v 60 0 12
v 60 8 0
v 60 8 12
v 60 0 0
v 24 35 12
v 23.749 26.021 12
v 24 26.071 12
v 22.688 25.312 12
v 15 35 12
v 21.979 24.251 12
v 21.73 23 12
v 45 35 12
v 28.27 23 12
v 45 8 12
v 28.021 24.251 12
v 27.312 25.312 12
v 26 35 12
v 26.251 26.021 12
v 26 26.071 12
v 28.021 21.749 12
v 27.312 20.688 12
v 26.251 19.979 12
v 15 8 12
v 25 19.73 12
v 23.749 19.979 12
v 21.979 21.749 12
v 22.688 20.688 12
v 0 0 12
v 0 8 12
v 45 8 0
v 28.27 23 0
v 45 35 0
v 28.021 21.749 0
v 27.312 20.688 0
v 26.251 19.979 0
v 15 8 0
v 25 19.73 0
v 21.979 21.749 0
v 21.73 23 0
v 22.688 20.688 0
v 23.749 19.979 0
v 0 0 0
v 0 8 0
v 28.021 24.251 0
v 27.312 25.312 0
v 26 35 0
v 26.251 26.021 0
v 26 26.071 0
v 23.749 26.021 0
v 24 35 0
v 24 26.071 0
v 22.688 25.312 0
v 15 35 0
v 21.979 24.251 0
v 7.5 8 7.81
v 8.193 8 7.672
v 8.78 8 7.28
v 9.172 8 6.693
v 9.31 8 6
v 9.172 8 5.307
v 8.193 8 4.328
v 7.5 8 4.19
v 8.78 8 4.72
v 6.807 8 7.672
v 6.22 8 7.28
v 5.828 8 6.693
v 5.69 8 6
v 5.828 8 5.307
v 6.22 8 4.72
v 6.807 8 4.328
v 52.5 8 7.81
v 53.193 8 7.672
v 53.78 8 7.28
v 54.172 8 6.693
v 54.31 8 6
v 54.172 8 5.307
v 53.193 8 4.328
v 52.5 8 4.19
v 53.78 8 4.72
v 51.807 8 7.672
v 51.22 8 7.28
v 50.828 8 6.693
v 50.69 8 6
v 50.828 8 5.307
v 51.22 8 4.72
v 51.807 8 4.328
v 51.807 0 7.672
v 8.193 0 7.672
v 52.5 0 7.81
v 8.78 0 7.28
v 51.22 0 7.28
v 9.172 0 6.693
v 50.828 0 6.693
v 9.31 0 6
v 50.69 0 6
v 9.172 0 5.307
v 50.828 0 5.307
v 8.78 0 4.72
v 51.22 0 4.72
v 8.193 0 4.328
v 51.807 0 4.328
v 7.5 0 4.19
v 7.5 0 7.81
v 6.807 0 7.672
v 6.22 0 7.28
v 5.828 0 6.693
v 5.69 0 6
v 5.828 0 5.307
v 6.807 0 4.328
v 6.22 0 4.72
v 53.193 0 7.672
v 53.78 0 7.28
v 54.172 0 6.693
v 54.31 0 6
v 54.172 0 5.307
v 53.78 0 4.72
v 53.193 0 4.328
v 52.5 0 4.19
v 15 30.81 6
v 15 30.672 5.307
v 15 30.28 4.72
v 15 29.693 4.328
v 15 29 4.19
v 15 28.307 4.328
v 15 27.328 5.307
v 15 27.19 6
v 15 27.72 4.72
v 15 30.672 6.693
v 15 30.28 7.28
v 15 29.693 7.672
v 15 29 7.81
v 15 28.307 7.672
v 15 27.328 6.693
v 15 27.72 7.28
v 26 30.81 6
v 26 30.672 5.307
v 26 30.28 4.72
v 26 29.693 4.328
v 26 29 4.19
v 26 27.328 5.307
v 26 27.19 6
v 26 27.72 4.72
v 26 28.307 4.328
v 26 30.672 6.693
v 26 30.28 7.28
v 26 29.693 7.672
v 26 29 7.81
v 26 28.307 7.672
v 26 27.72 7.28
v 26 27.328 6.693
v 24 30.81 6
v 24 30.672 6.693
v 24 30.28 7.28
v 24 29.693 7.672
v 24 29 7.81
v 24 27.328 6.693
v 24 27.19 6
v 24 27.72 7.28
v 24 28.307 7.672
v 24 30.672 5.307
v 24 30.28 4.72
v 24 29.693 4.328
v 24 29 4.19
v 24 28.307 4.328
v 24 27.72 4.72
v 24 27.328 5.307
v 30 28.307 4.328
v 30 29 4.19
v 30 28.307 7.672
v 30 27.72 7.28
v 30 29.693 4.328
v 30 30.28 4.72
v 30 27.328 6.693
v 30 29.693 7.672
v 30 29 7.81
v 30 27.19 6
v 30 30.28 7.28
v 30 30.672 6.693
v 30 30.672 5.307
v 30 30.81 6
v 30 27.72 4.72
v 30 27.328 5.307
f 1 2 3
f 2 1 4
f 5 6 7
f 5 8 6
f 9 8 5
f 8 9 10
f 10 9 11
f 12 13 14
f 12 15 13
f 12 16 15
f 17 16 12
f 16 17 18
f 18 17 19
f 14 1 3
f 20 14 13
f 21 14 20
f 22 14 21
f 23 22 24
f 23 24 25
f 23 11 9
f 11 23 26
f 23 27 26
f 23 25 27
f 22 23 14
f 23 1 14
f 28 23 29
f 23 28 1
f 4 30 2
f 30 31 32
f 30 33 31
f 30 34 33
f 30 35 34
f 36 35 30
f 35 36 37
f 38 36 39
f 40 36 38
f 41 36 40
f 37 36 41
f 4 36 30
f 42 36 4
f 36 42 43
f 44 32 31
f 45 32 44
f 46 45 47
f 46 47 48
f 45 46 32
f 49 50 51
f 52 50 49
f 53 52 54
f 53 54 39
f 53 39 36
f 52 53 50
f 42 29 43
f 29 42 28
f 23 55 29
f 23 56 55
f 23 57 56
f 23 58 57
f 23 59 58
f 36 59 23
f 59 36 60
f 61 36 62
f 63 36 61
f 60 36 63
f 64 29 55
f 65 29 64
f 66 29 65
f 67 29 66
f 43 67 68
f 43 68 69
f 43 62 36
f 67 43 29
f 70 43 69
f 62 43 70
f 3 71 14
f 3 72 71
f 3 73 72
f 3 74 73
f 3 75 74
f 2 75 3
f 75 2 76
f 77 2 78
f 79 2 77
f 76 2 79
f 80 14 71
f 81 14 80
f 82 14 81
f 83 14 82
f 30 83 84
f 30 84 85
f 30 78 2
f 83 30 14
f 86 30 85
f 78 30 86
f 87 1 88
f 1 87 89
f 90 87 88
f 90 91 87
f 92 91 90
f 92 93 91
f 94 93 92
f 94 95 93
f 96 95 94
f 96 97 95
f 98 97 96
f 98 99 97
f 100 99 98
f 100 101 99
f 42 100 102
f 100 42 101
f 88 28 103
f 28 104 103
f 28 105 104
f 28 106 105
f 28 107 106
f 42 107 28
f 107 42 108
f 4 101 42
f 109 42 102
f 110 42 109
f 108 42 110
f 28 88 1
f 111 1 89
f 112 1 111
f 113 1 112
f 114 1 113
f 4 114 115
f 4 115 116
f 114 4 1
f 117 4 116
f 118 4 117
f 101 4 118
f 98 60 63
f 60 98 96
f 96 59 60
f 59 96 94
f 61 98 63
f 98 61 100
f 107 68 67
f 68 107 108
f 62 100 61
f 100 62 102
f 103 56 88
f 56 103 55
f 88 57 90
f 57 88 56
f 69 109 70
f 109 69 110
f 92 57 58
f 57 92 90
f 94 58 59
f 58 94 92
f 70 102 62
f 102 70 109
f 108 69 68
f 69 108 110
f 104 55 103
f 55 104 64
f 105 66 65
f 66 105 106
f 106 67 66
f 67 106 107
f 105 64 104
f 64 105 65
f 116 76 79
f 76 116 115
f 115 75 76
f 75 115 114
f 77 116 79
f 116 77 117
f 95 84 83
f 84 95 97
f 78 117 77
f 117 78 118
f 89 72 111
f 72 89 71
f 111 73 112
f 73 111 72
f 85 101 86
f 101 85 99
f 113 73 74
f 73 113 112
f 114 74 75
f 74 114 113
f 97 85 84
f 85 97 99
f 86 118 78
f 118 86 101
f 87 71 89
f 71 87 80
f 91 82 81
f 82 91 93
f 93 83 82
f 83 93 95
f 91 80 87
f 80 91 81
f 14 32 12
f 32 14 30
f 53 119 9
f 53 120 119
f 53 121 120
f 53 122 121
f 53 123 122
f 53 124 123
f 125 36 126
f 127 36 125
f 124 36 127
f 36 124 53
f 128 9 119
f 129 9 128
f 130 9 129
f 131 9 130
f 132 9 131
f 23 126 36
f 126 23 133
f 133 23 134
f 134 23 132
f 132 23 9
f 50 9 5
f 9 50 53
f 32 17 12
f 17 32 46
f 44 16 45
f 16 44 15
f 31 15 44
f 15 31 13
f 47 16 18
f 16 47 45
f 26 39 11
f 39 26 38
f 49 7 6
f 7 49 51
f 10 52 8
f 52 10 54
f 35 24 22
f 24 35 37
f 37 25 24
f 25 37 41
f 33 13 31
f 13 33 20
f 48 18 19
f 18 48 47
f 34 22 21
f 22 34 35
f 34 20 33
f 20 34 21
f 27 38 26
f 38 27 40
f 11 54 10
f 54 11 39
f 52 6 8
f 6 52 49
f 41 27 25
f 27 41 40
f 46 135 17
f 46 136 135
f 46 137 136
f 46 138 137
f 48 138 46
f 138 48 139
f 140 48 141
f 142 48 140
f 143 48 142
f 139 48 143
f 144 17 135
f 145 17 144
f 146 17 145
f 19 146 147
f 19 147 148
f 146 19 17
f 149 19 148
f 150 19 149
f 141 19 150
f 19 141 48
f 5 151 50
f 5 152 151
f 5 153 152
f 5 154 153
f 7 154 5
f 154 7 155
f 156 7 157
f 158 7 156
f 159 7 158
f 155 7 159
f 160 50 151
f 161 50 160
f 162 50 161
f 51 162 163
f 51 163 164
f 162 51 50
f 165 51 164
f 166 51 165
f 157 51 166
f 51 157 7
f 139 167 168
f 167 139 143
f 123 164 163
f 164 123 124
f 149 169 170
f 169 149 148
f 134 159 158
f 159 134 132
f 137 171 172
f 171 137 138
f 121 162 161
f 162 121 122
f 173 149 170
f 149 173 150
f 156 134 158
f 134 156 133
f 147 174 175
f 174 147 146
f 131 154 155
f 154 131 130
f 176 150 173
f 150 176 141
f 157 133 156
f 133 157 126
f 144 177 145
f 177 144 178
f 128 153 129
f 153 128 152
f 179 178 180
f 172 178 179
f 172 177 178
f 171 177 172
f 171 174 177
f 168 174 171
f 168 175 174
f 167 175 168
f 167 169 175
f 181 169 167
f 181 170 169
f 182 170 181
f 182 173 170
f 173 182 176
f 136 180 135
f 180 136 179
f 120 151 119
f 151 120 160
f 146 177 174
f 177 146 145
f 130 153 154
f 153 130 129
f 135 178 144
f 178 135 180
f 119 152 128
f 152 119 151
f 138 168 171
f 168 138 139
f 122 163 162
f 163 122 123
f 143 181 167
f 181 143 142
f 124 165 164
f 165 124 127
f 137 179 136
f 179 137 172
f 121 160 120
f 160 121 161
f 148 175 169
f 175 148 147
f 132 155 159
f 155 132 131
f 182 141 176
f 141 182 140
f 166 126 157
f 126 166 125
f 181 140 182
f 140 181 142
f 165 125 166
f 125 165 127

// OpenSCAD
//-------------------------------------------------------
//2012-2013 Carignan's Design
//Under Open Hardware license
//And the help of all the previous Open hardware inventor
//and Designer Pionners
//-------------------------------------------------------
$fn=16;
//This parts is use to hold the herribord rack holding on the motor side

//Specs
ArmLenght     = 30; //mm
ArmWidth	  = 12; //mm
ArmHeight     = 30; //mm
ArmBaseLenght = 8;  //mm
ArmBaseHeight = ArmHeight+30; //mm
RodHoleRad    = 3.27; //mm
ScrewHoleRad  = 1.81; //mm


//Calculated pos and Spec
ArmX = (ArmBaseHeight - ArmHeight) /2;
ArmTopY = ArmLenght + ArmBaseLenght;

ScrewHoleOffset = (ArmBaseHeight - ArmHeight ) / 4 ;

//Draw the base
difference()
{
	union()
	{	
		cube([ArmBaseHeight,ArmBaseLenght,ArmWidth]);
		//translate([0,0,ArmBaseLenght]) rotate([270,0,00]) cylinder(h=ArmBaseLenght,r=ArmWidth/2); 
		//translate([ArmBaseHeight,0,ArmBaseLenght]) rotate([270,0,00]) cylinder(h=ArmBaseLenght,r=ArmWidth/2); 
	}
	translate([ScrewHoleOffset,0,ArmWidth/2]) rotate([270,0,00]) cylinder(h=ArmBaseLenght,r=ScrewHoleRad); 
	translate([ArmBaseHeight-ScrewHoleOffset,0,ArmWidth/2]) rotate([270,0,00]) cylinder(h=ArmBaseLenght,r=ScrewHoleRad); 
}

//Draw the main arm
difference()
{
	translate([ArmX,5,0]) cube([ArmHeight,ArmLenght,ArmWidth]);

	//Draw the Support Rod hole ( this hole will hold the Rod that will be inserted in the rack )
	translate([ArmX+10,ArmTopY-15,0]) cylinder(h=20, r=RodHoleRad);
	translate([ArmX+10-1,ArmTopY-15,0]) cube([2,15,20]);
	translate([30,ArmTopY-9,ArmWidth/2]) rotate([0,270,0])  cylinder(h=30,r=ScrewHoleRad);

}
